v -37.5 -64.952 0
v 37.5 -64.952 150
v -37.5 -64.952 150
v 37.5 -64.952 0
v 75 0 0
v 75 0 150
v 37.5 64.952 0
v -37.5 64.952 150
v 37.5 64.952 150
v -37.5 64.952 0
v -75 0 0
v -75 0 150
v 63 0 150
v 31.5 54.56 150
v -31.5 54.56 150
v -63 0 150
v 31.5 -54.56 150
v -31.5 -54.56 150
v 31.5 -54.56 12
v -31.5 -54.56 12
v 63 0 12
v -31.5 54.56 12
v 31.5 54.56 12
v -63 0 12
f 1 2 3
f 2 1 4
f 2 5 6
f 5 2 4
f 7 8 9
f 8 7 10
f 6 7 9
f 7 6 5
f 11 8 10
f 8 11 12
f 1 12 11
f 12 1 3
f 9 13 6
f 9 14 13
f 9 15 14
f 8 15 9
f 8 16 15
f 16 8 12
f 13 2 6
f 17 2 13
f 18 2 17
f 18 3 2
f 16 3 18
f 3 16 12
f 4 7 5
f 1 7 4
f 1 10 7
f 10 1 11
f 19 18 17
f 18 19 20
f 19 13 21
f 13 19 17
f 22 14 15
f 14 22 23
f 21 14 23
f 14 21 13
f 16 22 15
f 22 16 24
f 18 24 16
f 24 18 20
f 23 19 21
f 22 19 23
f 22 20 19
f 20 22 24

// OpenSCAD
$fn=6;
height=150;
diameter=150;
thickness=12;

difference() {
cylinder(d=diameter, h=height);
translate([0,0,thickness]) cylinder(d=diameter-2*thickness, h=height);
}
